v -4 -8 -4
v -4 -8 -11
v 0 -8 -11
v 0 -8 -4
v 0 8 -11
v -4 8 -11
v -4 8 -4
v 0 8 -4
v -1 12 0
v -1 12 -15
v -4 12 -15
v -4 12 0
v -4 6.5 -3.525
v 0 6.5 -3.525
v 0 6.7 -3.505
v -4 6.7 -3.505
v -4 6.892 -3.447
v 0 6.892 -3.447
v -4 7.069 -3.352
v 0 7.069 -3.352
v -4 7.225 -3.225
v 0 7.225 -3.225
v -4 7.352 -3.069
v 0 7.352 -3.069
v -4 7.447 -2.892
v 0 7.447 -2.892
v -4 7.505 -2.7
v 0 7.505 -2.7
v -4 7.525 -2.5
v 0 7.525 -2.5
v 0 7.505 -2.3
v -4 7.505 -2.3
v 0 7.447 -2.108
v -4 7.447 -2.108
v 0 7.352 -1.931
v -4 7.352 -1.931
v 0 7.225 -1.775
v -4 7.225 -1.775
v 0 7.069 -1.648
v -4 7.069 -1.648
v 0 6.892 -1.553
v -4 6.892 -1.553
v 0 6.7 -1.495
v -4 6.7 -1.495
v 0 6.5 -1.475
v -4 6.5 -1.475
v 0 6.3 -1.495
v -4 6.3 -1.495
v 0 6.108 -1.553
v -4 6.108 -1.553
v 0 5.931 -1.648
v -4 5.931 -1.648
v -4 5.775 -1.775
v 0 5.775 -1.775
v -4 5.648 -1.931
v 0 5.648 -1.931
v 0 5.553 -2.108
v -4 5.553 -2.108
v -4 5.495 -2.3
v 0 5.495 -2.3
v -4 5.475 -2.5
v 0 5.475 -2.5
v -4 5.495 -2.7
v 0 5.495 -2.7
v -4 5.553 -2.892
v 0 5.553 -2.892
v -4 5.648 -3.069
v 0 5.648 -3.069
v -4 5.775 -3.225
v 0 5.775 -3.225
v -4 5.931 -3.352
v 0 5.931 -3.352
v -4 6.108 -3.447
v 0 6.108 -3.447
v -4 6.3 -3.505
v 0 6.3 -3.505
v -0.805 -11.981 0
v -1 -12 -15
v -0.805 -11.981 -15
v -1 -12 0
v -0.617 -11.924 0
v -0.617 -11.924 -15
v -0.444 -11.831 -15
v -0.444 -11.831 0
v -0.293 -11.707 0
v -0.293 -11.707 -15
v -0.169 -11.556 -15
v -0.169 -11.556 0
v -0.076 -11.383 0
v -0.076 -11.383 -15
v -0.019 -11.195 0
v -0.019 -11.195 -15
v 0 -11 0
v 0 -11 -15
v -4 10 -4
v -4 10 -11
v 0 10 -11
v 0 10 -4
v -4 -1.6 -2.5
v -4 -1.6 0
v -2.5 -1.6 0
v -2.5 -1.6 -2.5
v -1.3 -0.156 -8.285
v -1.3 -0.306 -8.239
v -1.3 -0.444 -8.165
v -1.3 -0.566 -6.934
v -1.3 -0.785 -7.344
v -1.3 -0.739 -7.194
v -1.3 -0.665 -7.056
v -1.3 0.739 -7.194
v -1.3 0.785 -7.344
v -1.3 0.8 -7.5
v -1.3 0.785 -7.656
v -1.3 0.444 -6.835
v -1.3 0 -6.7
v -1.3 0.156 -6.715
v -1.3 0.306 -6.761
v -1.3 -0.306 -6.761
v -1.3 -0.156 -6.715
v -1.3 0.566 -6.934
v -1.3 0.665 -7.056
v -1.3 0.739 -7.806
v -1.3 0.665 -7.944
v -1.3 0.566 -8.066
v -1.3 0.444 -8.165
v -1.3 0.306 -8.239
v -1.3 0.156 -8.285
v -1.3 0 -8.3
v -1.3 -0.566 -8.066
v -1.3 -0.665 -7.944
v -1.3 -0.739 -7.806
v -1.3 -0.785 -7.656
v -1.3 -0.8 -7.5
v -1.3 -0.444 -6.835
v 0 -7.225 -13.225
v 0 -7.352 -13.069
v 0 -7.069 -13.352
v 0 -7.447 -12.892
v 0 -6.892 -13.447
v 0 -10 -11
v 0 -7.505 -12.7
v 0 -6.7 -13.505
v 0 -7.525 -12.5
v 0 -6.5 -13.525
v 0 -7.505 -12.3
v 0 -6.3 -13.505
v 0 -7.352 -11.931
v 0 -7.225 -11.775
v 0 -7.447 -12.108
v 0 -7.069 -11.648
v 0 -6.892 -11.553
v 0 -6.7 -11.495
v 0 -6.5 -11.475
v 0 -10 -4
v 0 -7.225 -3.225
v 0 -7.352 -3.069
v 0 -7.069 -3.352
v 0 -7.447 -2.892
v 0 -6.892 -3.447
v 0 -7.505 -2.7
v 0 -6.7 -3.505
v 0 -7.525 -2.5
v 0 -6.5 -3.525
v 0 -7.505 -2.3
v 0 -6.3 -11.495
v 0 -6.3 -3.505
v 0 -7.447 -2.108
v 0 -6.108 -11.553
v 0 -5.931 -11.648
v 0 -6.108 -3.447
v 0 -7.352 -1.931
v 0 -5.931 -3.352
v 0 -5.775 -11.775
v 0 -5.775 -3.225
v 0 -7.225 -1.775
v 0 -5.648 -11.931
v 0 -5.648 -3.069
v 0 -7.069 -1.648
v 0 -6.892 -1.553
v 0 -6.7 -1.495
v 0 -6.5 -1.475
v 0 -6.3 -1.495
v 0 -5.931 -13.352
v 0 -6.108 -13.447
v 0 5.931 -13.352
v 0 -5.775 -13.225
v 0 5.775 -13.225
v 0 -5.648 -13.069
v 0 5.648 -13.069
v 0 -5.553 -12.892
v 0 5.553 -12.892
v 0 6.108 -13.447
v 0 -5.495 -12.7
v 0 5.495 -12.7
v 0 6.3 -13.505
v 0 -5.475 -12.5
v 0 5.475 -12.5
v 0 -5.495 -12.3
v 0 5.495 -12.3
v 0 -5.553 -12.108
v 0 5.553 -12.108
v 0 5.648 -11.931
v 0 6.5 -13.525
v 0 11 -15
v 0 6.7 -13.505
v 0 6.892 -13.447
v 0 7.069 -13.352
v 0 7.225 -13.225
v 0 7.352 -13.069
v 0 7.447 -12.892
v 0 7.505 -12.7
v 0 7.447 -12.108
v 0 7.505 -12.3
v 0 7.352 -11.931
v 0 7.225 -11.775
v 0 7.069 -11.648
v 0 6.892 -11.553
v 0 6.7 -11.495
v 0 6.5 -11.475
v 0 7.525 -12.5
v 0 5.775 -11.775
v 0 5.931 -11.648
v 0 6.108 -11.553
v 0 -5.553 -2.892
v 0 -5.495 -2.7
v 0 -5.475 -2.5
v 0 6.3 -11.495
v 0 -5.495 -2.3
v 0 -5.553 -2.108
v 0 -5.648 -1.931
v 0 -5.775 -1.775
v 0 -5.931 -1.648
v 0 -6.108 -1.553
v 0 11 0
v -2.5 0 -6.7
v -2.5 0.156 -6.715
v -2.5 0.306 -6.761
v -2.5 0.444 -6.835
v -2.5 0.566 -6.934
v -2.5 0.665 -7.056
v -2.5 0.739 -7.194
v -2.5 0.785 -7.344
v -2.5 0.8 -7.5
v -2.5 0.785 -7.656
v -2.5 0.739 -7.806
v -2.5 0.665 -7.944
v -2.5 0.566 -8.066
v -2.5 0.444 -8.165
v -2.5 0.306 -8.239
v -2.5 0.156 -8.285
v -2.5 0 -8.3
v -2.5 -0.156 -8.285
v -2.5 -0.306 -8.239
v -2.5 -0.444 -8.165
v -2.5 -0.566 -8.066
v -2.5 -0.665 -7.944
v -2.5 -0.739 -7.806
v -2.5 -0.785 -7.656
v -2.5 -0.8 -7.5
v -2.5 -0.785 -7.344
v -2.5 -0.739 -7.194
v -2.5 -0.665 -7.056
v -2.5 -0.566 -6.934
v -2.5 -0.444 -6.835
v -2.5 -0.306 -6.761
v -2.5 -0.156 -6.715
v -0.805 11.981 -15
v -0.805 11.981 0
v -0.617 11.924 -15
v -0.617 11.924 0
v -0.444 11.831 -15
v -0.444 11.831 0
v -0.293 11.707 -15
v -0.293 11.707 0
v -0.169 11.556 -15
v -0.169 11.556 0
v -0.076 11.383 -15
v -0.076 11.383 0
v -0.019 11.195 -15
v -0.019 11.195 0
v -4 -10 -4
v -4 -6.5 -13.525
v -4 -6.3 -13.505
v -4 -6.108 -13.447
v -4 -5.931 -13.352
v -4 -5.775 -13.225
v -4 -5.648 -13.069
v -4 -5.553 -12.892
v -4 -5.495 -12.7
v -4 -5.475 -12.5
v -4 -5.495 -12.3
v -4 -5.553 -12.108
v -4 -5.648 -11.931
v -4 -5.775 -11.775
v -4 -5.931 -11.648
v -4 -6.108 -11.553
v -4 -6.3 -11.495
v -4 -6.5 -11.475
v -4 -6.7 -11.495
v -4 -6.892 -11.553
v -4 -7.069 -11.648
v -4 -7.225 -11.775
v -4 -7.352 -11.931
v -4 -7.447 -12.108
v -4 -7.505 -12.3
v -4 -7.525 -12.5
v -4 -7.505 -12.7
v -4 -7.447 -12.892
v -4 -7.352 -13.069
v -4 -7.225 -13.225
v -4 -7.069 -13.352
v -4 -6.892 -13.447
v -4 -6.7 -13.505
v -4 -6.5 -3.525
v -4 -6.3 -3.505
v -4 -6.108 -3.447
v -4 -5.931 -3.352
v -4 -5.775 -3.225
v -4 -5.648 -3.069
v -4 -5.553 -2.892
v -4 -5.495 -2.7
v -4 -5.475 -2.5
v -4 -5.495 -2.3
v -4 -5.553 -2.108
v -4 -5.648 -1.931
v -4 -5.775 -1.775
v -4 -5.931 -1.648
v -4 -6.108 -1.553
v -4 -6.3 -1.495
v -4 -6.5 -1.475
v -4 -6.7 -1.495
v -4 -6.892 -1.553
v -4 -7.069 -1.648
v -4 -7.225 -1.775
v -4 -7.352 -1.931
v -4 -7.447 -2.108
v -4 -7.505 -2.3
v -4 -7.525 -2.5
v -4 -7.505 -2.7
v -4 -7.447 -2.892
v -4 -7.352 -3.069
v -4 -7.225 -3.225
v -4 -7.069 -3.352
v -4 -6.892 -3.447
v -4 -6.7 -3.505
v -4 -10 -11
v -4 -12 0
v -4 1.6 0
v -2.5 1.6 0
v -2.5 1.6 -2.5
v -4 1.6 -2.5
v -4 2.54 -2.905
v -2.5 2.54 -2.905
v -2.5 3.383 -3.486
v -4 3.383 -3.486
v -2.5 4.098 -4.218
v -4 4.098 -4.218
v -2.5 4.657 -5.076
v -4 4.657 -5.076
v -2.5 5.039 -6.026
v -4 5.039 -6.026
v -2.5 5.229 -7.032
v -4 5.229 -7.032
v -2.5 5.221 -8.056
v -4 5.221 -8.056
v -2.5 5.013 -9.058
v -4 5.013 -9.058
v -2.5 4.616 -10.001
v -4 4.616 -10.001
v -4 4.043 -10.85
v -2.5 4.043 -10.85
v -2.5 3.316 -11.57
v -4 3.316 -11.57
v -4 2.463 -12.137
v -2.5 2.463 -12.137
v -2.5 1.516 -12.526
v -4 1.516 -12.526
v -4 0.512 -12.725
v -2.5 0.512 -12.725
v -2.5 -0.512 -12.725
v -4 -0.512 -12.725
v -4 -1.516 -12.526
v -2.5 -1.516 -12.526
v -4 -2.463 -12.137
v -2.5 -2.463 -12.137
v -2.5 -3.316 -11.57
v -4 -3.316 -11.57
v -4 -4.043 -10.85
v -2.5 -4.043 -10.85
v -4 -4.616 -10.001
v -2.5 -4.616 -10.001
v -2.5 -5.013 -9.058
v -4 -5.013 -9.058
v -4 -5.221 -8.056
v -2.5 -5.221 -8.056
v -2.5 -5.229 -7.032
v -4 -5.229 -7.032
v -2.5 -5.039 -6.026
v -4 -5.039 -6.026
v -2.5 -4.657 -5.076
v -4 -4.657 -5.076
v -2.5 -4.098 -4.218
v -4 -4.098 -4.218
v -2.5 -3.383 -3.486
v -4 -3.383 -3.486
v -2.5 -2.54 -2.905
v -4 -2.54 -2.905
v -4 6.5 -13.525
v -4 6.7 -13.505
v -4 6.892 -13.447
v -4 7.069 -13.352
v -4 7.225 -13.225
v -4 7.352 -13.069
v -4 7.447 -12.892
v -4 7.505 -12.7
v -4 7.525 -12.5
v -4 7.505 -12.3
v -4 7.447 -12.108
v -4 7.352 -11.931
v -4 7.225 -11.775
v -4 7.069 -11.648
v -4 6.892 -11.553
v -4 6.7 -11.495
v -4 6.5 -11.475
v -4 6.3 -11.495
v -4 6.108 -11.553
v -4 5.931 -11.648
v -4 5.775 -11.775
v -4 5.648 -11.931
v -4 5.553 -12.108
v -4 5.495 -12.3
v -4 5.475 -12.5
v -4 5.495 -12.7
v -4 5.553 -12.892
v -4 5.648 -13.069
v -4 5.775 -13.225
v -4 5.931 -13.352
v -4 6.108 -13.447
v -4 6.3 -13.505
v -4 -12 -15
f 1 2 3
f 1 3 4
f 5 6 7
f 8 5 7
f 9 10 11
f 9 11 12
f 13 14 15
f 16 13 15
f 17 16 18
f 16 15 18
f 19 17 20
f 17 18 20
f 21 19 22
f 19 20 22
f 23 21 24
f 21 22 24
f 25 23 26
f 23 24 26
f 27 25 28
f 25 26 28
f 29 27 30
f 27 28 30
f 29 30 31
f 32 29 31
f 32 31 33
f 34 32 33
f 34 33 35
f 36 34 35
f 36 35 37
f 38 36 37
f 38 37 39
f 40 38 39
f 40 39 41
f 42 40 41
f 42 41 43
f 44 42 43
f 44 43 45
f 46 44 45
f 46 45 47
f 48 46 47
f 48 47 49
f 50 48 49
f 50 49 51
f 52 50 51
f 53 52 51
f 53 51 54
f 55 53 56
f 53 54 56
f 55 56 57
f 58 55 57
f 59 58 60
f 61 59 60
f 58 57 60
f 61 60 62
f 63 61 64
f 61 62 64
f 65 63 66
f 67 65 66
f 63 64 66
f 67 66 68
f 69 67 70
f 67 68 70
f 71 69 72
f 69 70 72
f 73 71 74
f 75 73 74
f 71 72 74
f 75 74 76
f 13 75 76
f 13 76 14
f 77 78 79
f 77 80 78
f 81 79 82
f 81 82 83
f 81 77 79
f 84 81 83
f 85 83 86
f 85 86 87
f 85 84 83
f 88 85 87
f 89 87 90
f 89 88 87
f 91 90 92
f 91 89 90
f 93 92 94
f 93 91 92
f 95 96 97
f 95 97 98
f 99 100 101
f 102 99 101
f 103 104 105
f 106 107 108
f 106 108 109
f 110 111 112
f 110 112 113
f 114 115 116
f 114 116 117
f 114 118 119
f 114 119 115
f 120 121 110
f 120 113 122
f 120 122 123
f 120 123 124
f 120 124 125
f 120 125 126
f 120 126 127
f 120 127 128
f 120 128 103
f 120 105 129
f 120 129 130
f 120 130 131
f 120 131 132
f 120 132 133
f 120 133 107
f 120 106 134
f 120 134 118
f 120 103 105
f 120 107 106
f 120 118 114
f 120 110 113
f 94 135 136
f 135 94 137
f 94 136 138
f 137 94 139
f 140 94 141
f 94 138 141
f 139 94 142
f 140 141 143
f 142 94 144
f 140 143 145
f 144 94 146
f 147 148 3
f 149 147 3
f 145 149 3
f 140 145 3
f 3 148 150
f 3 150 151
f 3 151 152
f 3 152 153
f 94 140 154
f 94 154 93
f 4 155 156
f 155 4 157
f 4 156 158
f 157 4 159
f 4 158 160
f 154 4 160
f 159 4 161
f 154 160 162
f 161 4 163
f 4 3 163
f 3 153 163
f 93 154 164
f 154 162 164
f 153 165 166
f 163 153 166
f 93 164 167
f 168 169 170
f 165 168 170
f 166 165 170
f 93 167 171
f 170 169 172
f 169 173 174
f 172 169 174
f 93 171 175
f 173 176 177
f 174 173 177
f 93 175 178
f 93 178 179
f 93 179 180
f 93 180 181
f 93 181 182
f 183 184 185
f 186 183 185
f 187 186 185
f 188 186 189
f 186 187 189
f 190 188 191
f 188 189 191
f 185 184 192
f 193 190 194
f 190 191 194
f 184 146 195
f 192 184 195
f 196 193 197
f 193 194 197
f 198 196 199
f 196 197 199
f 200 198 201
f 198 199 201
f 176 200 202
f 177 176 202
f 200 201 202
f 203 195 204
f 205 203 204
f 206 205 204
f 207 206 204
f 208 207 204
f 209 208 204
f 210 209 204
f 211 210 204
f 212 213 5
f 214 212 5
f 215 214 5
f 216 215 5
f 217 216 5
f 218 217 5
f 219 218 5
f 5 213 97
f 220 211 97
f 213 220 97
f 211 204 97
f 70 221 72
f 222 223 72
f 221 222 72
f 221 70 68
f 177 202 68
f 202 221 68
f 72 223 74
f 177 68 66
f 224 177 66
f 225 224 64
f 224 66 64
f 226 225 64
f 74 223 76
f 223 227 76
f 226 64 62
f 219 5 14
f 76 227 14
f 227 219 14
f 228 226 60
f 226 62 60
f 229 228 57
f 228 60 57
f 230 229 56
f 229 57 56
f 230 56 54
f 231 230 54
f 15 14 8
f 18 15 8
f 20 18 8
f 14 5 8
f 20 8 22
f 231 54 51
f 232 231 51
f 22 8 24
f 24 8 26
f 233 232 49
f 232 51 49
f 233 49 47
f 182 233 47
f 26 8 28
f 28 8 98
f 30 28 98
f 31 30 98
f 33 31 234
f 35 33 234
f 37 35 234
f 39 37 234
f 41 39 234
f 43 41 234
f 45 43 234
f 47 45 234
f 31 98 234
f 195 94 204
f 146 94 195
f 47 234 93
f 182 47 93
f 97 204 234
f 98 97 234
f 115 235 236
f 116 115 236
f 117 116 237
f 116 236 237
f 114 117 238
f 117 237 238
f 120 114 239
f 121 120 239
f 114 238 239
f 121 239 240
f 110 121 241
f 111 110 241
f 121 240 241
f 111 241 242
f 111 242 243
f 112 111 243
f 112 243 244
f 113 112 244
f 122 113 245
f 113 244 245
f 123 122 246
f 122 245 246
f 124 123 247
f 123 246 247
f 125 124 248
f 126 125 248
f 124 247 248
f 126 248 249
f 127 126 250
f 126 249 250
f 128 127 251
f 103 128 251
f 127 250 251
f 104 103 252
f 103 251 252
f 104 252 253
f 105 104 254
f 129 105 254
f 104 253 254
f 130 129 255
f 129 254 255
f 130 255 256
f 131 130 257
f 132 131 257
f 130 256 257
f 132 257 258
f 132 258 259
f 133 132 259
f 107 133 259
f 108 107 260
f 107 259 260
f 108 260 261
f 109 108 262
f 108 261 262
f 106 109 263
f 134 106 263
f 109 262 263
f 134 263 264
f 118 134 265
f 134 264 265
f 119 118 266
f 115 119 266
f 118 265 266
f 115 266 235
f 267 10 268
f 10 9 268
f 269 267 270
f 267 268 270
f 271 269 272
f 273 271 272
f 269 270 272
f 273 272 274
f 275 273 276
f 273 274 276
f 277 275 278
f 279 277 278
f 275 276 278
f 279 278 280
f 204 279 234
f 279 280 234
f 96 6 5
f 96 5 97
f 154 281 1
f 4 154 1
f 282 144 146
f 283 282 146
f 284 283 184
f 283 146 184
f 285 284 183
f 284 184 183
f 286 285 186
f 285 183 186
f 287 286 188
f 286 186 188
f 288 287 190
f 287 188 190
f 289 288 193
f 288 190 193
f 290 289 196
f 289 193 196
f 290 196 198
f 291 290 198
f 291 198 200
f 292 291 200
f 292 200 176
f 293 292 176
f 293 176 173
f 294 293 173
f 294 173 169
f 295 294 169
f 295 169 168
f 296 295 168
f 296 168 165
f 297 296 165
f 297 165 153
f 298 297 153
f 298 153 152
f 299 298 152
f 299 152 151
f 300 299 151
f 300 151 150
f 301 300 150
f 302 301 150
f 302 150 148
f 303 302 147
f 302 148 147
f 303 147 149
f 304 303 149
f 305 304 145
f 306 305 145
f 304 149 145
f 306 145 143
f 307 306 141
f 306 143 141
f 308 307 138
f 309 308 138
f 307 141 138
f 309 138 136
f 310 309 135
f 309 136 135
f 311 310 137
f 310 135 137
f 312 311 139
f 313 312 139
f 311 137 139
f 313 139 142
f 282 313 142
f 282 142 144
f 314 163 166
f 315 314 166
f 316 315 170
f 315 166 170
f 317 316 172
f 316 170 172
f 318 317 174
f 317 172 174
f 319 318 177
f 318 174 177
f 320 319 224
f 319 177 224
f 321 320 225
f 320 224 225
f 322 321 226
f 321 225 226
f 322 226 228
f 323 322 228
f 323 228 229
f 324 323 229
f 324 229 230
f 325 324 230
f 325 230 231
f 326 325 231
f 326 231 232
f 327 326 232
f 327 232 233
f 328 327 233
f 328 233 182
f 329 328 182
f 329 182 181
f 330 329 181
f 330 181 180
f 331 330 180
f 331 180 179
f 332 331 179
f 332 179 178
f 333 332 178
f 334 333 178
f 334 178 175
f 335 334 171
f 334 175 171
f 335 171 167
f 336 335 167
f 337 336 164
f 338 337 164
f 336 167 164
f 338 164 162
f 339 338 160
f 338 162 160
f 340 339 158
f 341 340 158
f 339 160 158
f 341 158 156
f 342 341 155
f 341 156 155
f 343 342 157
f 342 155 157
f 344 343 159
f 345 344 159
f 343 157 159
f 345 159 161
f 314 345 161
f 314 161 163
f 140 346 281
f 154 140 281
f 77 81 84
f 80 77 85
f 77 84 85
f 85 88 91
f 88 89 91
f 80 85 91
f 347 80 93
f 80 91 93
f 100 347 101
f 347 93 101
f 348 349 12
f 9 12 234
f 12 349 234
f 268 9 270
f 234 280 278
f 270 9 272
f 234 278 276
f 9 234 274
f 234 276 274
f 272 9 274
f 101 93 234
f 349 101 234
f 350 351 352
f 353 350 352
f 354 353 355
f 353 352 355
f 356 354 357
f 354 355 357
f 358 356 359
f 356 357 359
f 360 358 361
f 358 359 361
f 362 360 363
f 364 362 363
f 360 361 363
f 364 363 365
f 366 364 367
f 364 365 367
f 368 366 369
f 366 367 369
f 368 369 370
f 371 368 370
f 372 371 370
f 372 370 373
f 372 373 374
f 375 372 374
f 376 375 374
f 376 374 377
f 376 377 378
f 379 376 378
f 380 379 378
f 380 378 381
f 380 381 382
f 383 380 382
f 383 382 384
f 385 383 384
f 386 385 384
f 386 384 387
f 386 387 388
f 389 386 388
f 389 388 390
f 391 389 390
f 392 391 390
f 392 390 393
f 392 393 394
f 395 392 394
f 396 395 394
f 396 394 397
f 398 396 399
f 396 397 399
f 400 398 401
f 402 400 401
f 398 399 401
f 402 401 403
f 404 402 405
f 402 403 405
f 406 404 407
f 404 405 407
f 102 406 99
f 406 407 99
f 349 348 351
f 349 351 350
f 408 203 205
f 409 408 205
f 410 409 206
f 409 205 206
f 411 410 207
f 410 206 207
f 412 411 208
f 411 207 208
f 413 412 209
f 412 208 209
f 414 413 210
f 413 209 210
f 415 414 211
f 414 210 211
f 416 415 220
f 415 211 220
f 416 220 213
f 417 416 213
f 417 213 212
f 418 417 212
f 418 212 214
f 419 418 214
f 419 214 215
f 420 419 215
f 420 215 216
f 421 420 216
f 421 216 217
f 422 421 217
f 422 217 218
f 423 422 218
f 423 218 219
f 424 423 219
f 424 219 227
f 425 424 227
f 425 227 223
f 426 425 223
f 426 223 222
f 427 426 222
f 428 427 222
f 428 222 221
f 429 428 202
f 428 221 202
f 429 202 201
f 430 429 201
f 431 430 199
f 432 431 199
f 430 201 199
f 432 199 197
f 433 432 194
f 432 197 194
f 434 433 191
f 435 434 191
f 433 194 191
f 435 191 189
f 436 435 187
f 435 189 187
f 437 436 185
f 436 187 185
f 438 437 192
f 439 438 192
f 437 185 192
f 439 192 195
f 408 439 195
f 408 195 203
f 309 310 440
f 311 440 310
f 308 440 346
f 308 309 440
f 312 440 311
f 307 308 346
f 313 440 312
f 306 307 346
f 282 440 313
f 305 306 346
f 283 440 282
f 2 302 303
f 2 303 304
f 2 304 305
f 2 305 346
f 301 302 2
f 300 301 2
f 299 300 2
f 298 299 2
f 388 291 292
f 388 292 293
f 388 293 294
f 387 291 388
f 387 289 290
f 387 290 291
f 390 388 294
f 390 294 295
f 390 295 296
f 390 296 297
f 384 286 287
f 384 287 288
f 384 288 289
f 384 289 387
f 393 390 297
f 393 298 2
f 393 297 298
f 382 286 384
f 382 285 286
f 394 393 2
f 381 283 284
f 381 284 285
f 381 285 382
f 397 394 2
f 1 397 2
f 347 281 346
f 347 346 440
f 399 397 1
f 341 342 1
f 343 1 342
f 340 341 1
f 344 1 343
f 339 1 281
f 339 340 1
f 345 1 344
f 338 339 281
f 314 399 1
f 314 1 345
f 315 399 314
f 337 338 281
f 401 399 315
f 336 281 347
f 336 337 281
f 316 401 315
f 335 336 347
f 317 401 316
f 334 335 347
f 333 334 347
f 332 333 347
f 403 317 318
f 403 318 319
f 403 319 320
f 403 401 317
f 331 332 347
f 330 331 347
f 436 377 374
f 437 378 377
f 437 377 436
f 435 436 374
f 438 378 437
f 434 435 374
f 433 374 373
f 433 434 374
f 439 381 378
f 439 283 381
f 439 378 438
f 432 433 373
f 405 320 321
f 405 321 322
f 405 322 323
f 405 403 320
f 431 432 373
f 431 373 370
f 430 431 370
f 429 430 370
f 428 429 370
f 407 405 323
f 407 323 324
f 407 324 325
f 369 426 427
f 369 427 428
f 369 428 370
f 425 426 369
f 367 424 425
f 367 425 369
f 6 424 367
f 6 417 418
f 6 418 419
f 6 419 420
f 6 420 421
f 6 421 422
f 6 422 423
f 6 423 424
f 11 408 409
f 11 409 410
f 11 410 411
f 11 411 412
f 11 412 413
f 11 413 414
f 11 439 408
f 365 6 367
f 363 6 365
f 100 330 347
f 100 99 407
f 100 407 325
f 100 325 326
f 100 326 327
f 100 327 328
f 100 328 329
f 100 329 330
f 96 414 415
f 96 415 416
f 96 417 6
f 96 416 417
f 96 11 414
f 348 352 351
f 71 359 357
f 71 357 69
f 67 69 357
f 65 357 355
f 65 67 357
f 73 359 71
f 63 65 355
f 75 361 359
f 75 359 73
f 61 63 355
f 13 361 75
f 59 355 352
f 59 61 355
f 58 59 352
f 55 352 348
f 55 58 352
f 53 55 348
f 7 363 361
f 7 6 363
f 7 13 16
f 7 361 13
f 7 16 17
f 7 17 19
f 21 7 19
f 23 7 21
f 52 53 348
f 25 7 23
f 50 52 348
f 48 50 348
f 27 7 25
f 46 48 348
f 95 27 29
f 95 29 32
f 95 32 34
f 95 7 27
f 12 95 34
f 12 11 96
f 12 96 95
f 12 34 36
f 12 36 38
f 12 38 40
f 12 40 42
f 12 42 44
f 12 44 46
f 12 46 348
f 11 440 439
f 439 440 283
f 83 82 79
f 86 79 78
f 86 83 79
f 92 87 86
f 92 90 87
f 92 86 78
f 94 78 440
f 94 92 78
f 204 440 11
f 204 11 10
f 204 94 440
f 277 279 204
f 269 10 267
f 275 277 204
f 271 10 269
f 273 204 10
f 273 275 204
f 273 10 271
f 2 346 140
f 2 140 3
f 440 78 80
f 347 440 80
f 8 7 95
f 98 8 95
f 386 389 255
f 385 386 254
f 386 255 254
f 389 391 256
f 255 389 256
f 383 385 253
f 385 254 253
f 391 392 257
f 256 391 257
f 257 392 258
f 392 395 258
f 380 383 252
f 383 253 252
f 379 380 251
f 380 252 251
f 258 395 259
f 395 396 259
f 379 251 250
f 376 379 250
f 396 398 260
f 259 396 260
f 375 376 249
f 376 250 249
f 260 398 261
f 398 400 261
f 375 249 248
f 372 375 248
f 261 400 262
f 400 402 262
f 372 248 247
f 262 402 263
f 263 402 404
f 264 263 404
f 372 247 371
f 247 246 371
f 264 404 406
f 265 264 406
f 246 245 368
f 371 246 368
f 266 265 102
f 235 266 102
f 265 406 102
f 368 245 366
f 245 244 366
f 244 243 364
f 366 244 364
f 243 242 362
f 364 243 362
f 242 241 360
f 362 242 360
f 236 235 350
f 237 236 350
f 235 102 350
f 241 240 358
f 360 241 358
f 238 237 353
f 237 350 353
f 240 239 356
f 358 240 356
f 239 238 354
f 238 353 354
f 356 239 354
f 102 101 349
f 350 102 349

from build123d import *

# Parameters (mm, degrees)
SKETCH1_W                    = 15
SKETCH1_H                    = 24
BOSS_EXTRUDE1_DEPTH          = 4
SKETCH2_R                    = 5.25
CUT_EXTRUDE1_DEPTH           = 1.5
CUT_EXTRUDE2_REACH           = 23.213
CUT_EXTRUDE2_END_RADIUS      = 5.25
SKETCH3_W                    = 1.5
SKETCH3_H                    = 3.2
SKETCH4_R                    = 0.8
CUT_EXTRUDE3_DEPTH           = 1.2
SKETCH5_W                    = 7
SKETCH5_H                    = 2
CUT_EXTRUDE4_DEPTH           = 20.62141687
M2_5X0_45_TAPPED_HOLE1_D     = 2.05
M2_5X0_45_TAPPED_HOLE1_DEPTH = 6.35
M2_5X0_45_TAPPED_HOLE1_TIP   = 0.615882135
FILLET1_R                    = 1


with BuildPart() as part:
    # Sketch1 → Boss-Extrude1 (new body)
    with BuildSketch(Plane(origin=(0, 0, -7.5), x_dir=(0, 0, 1), z_dir=(-1, 0, 0))):
        Rectangle(SKETCH1_W, SKETCH1_H)
    extrude(amount=BOSS_EXTRUDE1_DEPTH)

    # Sketch2 → Cut-Extrude1 (cut)
    with BuildSketch(Plane.ZY.offset(4)):
        with Locations((-7.5, 0)):
            Circle(SKETCH2_R)
    extrude(amount=-CUT_EXTRUDE1_DEPTH, mode=Mode.SUBTRACT)

    # Cut-Extrude2: up to this cylinder (the profile starts outside it)
    cut_extrude2_end = Plane(origin=(-3.25, 0, -7.5), z_dir=(-1, 0, 0)) * Cylinder(CUT_EXTRUDE2_END_RADIUS, 57.926, mode=Mode.PRIVATE)
    # Sketch3 → Cut-Extrude2 (cut, up to the surface)
    with BuildSketch(Plane(origin=(5, 0, 0), x_dir=(1, 0, 0), z_dir=(0, 0, 1)), mode=Mode.PRIVATE) as cut_extrude2_sk1:
        with Locations((-8.25, 0)):
            Rectangle(SKETCH3_W, SKETCH3_H)
    cut_extrude2_tool1 = extrude(cut_extrude2_sk1.sketch, amount=-CUT_EXTRUDE2_REACH, mode=Mode.PRIVATE) - cut_extrude2_end
    add(cut_extrude2_tool1.solids().sort_by_distance((-3.25, 0, 0))[0], mode=Mode.SUBTRACT)

    # Sketch4 → Cut-Extrude3 (cut)
    with BuildSketch(Plane.ZY.offset(2.5)):
        with Locations((-7.5, 0)):
            Circle(SKETCH4_R)
    extrude(amount=-CUT_EXTRUDE3_DEPTH, mode=Mode.SUBTRACT)

    # Sketch5 → Cut-Extrude4 (cut, through all)
    with BuildSketch(Plane.ZY.offset(4)):
        with Locations((-7.5, 9)):
            Rectangle(SKETCH5_W, SKETCH5_H)
        with Locations((-7.5, -9)):
            Rectangle(SKETCH5_W, SKETCH5_H)
    extrude(amount=-CUT_EXTRUDE4_DEPTH, mode=Mode.SUBTRACT)

    # M2.5x0.45 Tapped Hole1
    with Locations(Plane.ZY.offset(4)):
        with Locations((-12.5, -6.5), (-12.5, 6.5), (-2.5, 6.5), (-2.5, -6.5)):
            Hole(M2_5X0_45_TAPPED_HOLE1_D / 2, depth=M2_5X0_45_TAPPED_HOLE1_DEPTH)
            with Locations((0, 0, -(M2_5X0_45_TAPPED_HOLE1_DEPTH + M2_5X0_45_TAPPED_HOLE1_TIP / 2))):  # 118° drill point
                Cone(0, M2_5X0_45_TAPPED_HOLE1_D / 2, M2_5X0_45_TAPPED_HOLE1_TIP, mode=Mode.SUBTRACT)

    # Fillet1
    fillet1_edges = [part.edges().sort_by_distance(p)[0] for p in [
        (0, -12, -7.5),
        (0, 12, -7.5),
    ]]
    fillet(fillet1_edges, radius=FILLET1_R)


solid = part.part
